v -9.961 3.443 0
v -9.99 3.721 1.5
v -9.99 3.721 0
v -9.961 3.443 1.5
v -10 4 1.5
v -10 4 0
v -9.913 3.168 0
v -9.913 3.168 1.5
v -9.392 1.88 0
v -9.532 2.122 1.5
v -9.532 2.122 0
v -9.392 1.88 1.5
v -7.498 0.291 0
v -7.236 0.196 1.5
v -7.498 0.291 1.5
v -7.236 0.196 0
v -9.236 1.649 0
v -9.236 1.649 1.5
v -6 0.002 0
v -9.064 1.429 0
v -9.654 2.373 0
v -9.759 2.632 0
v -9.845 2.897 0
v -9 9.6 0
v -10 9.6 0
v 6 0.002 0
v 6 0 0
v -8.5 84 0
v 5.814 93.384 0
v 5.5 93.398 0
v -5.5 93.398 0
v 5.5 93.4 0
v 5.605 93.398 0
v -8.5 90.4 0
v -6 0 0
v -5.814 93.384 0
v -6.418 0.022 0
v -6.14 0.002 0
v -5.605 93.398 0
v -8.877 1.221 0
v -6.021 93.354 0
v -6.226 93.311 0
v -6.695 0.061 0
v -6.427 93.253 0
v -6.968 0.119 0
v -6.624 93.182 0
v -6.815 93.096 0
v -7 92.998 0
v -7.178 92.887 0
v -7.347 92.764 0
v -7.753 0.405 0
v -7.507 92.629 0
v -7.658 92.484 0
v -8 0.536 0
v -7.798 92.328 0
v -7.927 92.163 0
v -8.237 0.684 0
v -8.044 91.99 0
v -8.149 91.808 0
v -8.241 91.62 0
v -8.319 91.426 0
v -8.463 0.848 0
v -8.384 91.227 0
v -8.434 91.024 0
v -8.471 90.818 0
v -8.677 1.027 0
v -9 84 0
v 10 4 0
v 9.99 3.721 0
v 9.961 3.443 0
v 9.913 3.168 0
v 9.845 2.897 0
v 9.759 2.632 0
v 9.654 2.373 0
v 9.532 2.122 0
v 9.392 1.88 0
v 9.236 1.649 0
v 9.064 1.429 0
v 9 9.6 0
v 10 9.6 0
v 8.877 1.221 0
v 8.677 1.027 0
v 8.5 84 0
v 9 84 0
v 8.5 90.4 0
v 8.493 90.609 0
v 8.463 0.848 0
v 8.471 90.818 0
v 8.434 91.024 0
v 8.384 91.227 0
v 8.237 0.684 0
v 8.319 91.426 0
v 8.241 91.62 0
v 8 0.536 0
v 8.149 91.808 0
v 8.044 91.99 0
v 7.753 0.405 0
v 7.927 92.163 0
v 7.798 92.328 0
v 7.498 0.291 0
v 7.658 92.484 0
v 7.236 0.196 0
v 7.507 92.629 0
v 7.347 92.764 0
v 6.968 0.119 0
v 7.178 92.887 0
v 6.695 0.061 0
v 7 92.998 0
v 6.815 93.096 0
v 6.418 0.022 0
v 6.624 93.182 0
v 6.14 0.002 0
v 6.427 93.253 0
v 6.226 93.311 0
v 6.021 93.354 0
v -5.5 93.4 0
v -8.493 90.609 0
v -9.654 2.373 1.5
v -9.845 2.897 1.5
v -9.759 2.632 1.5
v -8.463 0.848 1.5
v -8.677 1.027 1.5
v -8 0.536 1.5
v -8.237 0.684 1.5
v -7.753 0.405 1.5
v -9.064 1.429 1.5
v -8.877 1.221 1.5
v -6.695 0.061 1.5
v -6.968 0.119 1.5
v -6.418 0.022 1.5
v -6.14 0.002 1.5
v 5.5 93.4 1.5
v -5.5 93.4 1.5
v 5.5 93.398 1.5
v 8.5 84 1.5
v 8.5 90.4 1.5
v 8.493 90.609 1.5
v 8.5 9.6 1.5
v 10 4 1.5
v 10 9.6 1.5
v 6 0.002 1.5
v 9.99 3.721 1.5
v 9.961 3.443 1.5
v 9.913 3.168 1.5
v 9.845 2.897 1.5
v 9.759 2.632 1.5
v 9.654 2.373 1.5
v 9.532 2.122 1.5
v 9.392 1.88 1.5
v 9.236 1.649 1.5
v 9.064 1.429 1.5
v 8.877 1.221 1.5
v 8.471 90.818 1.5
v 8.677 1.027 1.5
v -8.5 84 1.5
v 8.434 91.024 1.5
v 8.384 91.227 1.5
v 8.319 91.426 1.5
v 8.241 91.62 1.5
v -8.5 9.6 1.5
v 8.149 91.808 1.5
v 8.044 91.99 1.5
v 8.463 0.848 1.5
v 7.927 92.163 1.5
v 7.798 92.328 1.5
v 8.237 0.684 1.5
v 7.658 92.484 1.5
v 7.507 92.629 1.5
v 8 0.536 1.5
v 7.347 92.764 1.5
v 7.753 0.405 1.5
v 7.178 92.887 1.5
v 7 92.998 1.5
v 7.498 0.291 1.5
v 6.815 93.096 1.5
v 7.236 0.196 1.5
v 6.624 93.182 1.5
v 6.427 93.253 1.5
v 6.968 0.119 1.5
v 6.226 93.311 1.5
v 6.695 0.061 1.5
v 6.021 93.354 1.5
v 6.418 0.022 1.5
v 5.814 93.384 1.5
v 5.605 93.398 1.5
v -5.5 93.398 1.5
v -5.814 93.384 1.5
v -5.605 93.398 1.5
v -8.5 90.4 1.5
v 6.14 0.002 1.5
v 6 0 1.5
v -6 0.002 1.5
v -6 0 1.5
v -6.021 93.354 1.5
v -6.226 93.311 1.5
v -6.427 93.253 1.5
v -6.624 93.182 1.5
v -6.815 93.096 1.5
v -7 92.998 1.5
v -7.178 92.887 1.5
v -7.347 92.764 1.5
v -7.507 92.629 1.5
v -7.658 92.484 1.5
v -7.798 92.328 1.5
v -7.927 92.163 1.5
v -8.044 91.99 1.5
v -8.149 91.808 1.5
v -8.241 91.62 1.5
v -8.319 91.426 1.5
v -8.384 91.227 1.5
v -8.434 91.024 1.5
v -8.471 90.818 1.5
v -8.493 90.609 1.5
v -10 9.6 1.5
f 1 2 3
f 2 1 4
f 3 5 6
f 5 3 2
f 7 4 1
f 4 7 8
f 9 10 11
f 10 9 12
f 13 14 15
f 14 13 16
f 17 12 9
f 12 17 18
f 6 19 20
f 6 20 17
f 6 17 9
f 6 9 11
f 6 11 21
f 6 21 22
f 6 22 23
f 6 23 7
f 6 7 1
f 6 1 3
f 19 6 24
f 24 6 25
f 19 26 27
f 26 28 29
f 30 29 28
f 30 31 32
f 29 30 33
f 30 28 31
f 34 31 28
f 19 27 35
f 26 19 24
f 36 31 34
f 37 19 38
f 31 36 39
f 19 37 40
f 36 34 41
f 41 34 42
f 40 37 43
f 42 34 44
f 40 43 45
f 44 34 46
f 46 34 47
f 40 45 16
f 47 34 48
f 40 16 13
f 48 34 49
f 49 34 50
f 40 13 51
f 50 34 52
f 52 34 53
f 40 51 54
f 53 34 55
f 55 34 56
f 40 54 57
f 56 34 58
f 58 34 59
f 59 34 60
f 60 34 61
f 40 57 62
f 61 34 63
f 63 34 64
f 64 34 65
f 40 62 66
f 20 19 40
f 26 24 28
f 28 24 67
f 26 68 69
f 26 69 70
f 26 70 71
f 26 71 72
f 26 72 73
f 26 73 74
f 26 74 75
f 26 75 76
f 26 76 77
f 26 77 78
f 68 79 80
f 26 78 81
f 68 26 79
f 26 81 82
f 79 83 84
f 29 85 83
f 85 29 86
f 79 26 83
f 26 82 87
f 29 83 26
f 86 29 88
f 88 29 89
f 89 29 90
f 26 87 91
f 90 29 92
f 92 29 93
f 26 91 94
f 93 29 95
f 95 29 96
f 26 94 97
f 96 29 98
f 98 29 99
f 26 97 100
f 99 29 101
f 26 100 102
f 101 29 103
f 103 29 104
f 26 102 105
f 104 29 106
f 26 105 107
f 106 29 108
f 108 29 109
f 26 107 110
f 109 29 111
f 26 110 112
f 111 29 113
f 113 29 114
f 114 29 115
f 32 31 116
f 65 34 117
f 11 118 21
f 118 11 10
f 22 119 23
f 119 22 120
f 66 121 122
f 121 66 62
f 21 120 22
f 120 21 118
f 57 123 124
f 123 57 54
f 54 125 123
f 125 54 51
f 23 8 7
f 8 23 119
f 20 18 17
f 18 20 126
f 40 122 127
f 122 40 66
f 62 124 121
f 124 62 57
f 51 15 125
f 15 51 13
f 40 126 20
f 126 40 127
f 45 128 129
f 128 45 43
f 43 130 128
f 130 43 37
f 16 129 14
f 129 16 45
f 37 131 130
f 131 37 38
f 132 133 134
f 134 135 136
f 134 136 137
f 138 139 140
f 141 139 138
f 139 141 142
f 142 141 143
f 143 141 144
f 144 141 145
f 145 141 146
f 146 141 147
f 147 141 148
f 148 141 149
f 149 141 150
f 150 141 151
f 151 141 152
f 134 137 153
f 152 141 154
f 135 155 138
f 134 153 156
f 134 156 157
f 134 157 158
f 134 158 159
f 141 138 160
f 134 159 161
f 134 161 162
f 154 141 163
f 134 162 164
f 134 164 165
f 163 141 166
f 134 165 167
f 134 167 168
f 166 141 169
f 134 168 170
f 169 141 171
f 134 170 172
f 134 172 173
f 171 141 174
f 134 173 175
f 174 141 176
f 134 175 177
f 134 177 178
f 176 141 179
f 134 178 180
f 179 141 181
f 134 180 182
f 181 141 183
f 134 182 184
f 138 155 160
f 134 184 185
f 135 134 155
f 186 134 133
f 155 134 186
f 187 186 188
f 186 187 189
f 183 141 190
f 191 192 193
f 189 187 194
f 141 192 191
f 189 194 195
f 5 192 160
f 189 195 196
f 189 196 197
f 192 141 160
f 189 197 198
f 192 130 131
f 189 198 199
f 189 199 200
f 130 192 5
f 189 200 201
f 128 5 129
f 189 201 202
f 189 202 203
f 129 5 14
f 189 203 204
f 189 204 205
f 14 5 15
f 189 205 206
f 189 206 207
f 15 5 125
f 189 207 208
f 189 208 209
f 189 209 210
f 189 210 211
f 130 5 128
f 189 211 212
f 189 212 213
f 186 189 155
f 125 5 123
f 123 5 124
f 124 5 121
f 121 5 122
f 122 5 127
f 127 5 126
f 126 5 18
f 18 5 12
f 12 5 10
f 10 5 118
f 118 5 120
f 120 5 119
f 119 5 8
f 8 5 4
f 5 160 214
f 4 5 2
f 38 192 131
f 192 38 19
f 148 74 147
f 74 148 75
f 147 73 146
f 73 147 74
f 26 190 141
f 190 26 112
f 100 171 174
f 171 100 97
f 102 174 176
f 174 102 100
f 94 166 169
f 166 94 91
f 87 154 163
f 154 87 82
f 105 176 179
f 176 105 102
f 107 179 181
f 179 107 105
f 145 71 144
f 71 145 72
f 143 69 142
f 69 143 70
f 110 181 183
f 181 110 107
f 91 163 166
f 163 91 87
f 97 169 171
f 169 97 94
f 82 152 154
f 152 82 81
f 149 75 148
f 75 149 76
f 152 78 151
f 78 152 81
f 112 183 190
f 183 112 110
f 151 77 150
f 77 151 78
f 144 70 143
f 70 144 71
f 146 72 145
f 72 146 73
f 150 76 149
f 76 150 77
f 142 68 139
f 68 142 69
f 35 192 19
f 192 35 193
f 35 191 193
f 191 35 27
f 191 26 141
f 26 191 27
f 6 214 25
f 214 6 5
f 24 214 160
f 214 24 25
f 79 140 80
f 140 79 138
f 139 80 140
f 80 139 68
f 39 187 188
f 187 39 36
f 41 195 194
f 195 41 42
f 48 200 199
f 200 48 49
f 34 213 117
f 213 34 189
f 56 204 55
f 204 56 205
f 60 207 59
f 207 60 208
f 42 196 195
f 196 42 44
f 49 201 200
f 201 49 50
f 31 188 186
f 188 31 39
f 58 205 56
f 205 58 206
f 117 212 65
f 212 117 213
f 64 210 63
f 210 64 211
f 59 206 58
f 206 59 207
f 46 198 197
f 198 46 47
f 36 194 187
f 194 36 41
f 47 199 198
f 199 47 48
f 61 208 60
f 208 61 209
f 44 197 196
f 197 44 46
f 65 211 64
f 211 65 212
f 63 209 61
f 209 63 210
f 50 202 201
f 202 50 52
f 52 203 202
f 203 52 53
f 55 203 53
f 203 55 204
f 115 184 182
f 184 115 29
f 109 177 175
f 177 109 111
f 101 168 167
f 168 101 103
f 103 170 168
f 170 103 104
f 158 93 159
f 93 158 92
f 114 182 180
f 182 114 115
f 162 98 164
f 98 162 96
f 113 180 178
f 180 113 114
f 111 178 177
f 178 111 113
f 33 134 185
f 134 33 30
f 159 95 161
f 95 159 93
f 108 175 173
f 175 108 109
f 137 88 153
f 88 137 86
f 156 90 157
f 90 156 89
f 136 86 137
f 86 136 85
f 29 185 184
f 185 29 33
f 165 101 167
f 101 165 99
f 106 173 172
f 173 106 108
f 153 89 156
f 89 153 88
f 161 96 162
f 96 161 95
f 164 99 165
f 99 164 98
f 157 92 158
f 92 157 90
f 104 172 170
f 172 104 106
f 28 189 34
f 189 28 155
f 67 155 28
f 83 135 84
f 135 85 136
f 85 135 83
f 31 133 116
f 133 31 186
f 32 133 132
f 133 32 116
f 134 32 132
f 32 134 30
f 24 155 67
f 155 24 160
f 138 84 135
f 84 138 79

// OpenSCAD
depth = 1.5;

big_end_width = 20;
bottom_width = 18;
top_width = 17;
small_end_width = top_width;

big_end_len = 9.6;
small_end_len = 9.4;
total_len = 93.4;
centre_len = total_len - big_end_len - small_end_len;
echo(big_end_len=big_end_len, small_end_len=small_end_len,
     centre_len=centre_len, total_len=total_len);

big_end_radius = 4;
small_end_radius = 3;

label = "";
label_border = 2;
font="Helvetica Neue";
stretch = 1.5;
label_depth = 0.5;

$fn = 90;

difference()
{
    rotate([90,0,180])
    {
        union()
        {
            %
            translate([-big_end_width/2, 0, 0])
            cube([big_end_width, depth, big_end_len]);

            translate([big_end_width/2 - big_end_radius, 0, big_end_radius])
            rotate([270, 0, 0])
            cylinder(h=depth, r=big_end_radius);

            translate([big_end_radius - big_end_width/2, 0, big_end_radius])
            rotate([270, 0, 0])
            cylinder(h=depth, r=big_end_radius);

            translate([-big_end_width/2 + big_end_radius, 0, 0])
            cube([big_end_width - 2*big_end_radius, depth, big_end_radius]);

            translate([-big_end_width/2, 0, big_end_radius])
            cube([big_end_width, depth, big_end_len - big_end_radius]);
        }

        translate([-bottom_width/2, 0, big_end_len])
        linear_extrude(height=centre_len)
        polygon([[0, 0],
                 [bottom_width, 0],
                 [(bottom_width + top_width)/2, depth],
                 [(bottom_width - top_width)/2, depth]]);

        union()
        {
            %
            translate([-small_end_width/2, 0, big_end_len + centre_len])
            cube([small_end_width, depth, small_end_len]);

            translate([small_end_width/2 - small_end_radius,
                        0,
                        total_len - small_end_radius])
            rotate([270, 0, 0])
            cylinder(h=depth, r=small_end_radius);

            translate([small_end_radius - small_end_width/2,
                       0,
                       total_len - small_end_radius])
            rotate([270, 0, 0])
            cylinder(h=depth, r=small_end_radius);

            translate([-small_end_width/2, 0, big_end_len + centre_len])
            cube([small_end_width, depth, small_end_len - small_end_radius]);

            translate([-small_end_width/2 + small_end_radius,
                       0,
                       total_len - small_end_radius])
            cube([small_end_width - 2*small_end_radius,
                  depth,
                  small_end_radius]);
        }
    }

    // Double the depth since we're taking a difference and that means there's
    // no "surface" to worry about.
    #
    translate([0, 1.5*big_end_len, depth - label_depth])
    linear_extrude(height=label_depth*2)
    scale([1, stretch, 1])
    rotate([0,0,-90])
    text(label, halign="right", valign="baseline",
         size=top_width/2 - label_border, font=font);
}
